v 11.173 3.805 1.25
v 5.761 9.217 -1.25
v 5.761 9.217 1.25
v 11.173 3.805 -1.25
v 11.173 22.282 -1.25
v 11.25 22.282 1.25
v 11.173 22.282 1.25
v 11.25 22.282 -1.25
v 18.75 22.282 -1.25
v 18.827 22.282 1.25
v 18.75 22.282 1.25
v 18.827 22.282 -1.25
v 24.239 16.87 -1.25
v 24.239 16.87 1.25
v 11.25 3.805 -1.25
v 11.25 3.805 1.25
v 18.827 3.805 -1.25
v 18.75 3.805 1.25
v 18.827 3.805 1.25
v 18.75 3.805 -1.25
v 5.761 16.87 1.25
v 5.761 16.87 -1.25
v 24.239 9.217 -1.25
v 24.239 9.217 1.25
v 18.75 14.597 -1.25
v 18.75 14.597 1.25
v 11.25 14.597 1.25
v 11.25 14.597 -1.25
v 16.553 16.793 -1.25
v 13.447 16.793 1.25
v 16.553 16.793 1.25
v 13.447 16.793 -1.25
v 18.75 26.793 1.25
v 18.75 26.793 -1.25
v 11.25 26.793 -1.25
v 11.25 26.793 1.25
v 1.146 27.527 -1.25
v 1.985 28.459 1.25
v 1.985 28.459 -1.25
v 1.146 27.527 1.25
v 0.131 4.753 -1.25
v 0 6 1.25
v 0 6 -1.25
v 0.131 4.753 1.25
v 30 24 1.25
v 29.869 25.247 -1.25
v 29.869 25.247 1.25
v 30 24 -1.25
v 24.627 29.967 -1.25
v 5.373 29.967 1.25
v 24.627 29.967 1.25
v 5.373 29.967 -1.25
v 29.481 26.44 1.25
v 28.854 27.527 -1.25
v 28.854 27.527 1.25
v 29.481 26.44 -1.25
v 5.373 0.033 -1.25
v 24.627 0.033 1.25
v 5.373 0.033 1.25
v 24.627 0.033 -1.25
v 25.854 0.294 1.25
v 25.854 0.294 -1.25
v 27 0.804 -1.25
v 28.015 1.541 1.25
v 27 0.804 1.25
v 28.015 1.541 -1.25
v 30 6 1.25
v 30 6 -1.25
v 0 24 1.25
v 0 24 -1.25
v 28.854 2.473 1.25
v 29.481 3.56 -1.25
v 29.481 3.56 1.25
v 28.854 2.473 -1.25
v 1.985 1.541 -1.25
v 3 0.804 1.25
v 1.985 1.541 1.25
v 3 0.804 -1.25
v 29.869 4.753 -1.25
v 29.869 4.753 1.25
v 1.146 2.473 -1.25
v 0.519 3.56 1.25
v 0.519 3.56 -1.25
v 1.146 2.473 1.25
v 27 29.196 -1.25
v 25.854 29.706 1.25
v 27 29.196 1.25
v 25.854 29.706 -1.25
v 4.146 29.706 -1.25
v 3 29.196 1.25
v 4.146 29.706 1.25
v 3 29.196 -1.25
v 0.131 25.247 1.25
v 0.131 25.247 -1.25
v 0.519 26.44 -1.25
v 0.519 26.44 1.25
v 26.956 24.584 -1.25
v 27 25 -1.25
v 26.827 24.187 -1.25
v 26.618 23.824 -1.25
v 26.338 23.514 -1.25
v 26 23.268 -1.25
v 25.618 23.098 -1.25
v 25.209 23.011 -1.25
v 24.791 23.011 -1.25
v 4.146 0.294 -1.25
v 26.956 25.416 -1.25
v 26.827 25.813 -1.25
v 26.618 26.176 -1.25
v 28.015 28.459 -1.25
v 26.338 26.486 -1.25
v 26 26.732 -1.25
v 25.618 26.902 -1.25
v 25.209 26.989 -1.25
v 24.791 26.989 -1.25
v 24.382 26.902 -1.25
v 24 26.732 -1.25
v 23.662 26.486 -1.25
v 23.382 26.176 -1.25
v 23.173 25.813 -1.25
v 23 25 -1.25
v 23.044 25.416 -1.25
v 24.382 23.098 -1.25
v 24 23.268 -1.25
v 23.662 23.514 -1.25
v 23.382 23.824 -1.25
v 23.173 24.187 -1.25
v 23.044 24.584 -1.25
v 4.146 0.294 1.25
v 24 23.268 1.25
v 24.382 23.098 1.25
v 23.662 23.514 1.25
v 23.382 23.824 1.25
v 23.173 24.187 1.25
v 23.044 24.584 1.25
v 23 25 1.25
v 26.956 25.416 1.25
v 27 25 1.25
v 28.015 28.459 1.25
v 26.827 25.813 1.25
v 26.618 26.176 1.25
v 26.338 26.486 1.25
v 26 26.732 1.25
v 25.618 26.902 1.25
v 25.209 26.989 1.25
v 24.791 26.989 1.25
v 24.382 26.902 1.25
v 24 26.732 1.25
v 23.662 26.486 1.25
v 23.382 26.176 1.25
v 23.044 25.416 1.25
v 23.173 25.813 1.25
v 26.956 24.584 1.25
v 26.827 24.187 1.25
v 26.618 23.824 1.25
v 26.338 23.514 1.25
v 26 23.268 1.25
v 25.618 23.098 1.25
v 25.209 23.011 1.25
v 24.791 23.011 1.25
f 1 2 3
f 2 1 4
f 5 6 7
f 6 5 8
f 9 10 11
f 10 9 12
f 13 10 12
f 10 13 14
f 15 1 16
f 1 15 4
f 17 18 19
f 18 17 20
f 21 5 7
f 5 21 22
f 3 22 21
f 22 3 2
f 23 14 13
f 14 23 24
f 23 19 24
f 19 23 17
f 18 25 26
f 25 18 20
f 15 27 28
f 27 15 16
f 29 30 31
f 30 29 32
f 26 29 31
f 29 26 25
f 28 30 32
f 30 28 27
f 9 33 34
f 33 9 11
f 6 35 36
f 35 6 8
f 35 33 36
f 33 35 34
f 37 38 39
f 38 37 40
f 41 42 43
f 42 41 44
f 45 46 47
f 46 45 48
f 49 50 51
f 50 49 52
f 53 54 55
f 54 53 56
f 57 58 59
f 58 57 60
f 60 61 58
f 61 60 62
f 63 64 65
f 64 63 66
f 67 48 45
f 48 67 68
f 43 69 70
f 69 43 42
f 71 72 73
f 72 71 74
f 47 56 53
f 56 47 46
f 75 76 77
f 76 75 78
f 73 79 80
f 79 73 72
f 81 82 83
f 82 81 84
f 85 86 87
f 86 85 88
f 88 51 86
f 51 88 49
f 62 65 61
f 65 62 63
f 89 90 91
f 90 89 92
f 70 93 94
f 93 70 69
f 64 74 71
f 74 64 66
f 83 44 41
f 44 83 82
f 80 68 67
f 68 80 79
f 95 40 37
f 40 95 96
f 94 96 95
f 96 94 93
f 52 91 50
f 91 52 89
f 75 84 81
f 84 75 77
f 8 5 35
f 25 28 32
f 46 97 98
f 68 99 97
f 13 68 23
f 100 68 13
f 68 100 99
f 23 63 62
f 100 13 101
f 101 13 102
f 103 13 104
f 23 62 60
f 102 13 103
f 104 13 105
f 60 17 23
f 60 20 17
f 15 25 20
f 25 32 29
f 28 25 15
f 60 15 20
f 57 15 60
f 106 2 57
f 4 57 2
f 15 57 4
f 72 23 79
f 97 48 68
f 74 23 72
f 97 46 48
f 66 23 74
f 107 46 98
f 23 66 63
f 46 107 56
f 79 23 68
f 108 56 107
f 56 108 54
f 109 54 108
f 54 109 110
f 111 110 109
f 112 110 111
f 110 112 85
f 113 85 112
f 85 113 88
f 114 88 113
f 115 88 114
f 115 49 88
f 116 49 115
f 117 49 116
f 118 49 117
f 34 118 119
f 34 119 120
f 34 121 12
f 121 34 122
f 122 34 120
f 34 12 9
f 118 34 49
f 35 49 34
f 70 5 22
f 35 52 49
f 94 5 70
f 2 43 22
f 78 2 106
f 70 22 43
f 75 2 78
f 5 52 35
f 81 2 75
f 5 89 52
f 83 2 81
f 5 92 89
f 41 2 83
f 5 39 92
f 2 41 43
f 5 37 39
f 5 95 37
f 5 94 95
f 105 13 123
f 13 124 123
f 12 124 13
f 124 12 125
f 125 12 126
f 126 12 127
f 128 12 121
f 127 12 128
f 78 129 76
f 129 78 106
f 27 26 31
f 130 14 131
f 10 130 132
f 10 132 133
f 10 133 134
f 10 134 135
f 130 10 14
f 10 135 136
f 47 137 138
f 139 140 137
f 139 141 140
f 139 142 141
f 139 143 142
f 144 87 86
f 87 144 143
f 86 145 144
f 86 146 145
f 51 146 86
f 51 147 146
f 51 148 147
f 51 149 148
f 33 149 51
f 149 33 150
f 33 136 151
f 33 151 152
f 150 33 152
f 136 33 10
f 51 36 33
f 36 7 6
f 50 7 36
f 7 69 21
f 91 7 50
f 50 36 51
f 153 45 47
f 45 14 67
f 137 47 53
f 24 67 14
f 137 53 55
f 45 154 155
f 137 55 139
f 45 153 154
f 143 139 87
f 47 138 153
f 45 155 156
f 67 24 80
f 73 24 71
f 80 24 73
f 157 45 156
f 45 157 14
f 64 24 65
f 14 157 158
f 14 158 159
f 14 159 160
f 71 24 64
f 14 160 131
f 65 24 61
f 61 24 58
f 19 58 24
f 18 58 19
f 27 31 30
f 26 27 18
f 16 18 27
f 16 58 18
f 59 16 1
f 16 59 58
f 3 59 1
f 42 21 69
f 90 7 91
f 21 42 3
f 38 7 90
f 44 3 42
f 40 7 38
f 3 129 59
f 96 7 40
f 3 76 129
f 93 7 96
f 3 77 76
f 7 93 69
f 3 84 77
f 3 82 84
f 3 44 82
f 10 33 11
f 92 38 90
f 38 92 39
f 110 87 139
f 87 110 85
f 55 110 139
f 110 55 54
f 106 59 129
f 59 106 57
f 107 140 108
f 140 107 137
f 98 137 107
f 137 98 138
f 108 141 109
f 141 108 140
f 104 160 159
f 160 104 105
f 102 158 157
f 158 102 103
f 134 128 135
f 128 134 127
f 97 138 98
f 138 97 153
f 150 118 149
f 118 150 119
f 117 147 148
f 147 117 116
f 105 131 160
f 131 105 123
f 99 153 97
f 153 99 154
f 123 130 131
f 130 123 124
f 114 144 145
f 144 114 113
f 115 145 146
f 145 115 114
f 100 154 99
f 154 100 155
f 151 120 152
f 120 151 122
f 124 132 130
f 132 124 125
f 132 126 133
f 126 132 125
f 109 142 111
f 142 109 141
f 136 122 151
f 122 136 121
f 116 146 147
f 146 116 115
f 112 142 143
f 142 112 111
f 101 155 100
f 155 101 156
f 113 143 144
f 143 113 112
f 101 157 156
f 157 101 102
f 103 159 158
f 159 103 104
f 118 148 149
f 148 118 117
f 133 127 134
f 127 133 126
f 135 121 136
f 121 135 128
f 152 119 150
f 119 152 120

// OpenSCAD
/*
 * So Make It (http://www.somakeit.org.uk/) Logo Key Ring
 *
 * Copyright (c) 2013 Mark Hindess & Bracken Dawson
 * License:
 *   Creative Commons Attribution-ShareAlike 3.0 Unported License
 *   http://creativecommons.org/licenses/by-sa/3.0
 */

thickness = 2.5;
size = 30;
corner_radius = 6;
hole_radius = 2;
$fn = 30;

somakeit_logo(thickness, size, corner_radius, hole_radius, 30);

module somakeit_logo(thickness, size, corner_radius, hole_radius, $fn) {

difference() {

  // simple rounded square
  hull() {
    translate([corner_radius, corner_radius, 0])
      cylinder(r = corner_radius, h = thickness, center = true);
    translate([size-corner_radius, corner_radius, 0])
      cylinder(r = corner_radius, h = thickness, center = true);
    translate([size-corner_radius, size-corner_radius, 0])
      cylinder(r = corner_radius, h = thickness, center = true);
    translate([corner_radius, size-corner_radius, 0])
      cylinder(r = corner_radius, h = thickness, center = true);
  }
  // slightly off center to allow for "handle"
  translate([size/2, size/2.3, 0]) {
    difference() {
      // large octagon
      rotate([0,0,22.5])
        cylinder(r = size/3, h = thickness+2, center = true, $fn = 8);

      // central bar
      translate([0,-(1+size/6),-1])
        cube([size/4, 1+size/3, thickness+3], center = true);
      // octagonal end of central bar
      rotate([0,0,22.5])
        cylinder(r = size/(8*cos(22.5)), h = thickness+3,
                 $fn = 8, center = true);
    }

    // handle
    translate([0,size/3,-1])
      cube([size/4, size/4, thickness+3], center = true);
  }

  // hole for attachment
  translate([size-hole_radius-(corner_radius/2),
             size-hole_radius-(corner_radius/2), 0])
    cylinder(r = hole_radius, h = thickness+2, center = true);
}

}  // module somakeit_logo
